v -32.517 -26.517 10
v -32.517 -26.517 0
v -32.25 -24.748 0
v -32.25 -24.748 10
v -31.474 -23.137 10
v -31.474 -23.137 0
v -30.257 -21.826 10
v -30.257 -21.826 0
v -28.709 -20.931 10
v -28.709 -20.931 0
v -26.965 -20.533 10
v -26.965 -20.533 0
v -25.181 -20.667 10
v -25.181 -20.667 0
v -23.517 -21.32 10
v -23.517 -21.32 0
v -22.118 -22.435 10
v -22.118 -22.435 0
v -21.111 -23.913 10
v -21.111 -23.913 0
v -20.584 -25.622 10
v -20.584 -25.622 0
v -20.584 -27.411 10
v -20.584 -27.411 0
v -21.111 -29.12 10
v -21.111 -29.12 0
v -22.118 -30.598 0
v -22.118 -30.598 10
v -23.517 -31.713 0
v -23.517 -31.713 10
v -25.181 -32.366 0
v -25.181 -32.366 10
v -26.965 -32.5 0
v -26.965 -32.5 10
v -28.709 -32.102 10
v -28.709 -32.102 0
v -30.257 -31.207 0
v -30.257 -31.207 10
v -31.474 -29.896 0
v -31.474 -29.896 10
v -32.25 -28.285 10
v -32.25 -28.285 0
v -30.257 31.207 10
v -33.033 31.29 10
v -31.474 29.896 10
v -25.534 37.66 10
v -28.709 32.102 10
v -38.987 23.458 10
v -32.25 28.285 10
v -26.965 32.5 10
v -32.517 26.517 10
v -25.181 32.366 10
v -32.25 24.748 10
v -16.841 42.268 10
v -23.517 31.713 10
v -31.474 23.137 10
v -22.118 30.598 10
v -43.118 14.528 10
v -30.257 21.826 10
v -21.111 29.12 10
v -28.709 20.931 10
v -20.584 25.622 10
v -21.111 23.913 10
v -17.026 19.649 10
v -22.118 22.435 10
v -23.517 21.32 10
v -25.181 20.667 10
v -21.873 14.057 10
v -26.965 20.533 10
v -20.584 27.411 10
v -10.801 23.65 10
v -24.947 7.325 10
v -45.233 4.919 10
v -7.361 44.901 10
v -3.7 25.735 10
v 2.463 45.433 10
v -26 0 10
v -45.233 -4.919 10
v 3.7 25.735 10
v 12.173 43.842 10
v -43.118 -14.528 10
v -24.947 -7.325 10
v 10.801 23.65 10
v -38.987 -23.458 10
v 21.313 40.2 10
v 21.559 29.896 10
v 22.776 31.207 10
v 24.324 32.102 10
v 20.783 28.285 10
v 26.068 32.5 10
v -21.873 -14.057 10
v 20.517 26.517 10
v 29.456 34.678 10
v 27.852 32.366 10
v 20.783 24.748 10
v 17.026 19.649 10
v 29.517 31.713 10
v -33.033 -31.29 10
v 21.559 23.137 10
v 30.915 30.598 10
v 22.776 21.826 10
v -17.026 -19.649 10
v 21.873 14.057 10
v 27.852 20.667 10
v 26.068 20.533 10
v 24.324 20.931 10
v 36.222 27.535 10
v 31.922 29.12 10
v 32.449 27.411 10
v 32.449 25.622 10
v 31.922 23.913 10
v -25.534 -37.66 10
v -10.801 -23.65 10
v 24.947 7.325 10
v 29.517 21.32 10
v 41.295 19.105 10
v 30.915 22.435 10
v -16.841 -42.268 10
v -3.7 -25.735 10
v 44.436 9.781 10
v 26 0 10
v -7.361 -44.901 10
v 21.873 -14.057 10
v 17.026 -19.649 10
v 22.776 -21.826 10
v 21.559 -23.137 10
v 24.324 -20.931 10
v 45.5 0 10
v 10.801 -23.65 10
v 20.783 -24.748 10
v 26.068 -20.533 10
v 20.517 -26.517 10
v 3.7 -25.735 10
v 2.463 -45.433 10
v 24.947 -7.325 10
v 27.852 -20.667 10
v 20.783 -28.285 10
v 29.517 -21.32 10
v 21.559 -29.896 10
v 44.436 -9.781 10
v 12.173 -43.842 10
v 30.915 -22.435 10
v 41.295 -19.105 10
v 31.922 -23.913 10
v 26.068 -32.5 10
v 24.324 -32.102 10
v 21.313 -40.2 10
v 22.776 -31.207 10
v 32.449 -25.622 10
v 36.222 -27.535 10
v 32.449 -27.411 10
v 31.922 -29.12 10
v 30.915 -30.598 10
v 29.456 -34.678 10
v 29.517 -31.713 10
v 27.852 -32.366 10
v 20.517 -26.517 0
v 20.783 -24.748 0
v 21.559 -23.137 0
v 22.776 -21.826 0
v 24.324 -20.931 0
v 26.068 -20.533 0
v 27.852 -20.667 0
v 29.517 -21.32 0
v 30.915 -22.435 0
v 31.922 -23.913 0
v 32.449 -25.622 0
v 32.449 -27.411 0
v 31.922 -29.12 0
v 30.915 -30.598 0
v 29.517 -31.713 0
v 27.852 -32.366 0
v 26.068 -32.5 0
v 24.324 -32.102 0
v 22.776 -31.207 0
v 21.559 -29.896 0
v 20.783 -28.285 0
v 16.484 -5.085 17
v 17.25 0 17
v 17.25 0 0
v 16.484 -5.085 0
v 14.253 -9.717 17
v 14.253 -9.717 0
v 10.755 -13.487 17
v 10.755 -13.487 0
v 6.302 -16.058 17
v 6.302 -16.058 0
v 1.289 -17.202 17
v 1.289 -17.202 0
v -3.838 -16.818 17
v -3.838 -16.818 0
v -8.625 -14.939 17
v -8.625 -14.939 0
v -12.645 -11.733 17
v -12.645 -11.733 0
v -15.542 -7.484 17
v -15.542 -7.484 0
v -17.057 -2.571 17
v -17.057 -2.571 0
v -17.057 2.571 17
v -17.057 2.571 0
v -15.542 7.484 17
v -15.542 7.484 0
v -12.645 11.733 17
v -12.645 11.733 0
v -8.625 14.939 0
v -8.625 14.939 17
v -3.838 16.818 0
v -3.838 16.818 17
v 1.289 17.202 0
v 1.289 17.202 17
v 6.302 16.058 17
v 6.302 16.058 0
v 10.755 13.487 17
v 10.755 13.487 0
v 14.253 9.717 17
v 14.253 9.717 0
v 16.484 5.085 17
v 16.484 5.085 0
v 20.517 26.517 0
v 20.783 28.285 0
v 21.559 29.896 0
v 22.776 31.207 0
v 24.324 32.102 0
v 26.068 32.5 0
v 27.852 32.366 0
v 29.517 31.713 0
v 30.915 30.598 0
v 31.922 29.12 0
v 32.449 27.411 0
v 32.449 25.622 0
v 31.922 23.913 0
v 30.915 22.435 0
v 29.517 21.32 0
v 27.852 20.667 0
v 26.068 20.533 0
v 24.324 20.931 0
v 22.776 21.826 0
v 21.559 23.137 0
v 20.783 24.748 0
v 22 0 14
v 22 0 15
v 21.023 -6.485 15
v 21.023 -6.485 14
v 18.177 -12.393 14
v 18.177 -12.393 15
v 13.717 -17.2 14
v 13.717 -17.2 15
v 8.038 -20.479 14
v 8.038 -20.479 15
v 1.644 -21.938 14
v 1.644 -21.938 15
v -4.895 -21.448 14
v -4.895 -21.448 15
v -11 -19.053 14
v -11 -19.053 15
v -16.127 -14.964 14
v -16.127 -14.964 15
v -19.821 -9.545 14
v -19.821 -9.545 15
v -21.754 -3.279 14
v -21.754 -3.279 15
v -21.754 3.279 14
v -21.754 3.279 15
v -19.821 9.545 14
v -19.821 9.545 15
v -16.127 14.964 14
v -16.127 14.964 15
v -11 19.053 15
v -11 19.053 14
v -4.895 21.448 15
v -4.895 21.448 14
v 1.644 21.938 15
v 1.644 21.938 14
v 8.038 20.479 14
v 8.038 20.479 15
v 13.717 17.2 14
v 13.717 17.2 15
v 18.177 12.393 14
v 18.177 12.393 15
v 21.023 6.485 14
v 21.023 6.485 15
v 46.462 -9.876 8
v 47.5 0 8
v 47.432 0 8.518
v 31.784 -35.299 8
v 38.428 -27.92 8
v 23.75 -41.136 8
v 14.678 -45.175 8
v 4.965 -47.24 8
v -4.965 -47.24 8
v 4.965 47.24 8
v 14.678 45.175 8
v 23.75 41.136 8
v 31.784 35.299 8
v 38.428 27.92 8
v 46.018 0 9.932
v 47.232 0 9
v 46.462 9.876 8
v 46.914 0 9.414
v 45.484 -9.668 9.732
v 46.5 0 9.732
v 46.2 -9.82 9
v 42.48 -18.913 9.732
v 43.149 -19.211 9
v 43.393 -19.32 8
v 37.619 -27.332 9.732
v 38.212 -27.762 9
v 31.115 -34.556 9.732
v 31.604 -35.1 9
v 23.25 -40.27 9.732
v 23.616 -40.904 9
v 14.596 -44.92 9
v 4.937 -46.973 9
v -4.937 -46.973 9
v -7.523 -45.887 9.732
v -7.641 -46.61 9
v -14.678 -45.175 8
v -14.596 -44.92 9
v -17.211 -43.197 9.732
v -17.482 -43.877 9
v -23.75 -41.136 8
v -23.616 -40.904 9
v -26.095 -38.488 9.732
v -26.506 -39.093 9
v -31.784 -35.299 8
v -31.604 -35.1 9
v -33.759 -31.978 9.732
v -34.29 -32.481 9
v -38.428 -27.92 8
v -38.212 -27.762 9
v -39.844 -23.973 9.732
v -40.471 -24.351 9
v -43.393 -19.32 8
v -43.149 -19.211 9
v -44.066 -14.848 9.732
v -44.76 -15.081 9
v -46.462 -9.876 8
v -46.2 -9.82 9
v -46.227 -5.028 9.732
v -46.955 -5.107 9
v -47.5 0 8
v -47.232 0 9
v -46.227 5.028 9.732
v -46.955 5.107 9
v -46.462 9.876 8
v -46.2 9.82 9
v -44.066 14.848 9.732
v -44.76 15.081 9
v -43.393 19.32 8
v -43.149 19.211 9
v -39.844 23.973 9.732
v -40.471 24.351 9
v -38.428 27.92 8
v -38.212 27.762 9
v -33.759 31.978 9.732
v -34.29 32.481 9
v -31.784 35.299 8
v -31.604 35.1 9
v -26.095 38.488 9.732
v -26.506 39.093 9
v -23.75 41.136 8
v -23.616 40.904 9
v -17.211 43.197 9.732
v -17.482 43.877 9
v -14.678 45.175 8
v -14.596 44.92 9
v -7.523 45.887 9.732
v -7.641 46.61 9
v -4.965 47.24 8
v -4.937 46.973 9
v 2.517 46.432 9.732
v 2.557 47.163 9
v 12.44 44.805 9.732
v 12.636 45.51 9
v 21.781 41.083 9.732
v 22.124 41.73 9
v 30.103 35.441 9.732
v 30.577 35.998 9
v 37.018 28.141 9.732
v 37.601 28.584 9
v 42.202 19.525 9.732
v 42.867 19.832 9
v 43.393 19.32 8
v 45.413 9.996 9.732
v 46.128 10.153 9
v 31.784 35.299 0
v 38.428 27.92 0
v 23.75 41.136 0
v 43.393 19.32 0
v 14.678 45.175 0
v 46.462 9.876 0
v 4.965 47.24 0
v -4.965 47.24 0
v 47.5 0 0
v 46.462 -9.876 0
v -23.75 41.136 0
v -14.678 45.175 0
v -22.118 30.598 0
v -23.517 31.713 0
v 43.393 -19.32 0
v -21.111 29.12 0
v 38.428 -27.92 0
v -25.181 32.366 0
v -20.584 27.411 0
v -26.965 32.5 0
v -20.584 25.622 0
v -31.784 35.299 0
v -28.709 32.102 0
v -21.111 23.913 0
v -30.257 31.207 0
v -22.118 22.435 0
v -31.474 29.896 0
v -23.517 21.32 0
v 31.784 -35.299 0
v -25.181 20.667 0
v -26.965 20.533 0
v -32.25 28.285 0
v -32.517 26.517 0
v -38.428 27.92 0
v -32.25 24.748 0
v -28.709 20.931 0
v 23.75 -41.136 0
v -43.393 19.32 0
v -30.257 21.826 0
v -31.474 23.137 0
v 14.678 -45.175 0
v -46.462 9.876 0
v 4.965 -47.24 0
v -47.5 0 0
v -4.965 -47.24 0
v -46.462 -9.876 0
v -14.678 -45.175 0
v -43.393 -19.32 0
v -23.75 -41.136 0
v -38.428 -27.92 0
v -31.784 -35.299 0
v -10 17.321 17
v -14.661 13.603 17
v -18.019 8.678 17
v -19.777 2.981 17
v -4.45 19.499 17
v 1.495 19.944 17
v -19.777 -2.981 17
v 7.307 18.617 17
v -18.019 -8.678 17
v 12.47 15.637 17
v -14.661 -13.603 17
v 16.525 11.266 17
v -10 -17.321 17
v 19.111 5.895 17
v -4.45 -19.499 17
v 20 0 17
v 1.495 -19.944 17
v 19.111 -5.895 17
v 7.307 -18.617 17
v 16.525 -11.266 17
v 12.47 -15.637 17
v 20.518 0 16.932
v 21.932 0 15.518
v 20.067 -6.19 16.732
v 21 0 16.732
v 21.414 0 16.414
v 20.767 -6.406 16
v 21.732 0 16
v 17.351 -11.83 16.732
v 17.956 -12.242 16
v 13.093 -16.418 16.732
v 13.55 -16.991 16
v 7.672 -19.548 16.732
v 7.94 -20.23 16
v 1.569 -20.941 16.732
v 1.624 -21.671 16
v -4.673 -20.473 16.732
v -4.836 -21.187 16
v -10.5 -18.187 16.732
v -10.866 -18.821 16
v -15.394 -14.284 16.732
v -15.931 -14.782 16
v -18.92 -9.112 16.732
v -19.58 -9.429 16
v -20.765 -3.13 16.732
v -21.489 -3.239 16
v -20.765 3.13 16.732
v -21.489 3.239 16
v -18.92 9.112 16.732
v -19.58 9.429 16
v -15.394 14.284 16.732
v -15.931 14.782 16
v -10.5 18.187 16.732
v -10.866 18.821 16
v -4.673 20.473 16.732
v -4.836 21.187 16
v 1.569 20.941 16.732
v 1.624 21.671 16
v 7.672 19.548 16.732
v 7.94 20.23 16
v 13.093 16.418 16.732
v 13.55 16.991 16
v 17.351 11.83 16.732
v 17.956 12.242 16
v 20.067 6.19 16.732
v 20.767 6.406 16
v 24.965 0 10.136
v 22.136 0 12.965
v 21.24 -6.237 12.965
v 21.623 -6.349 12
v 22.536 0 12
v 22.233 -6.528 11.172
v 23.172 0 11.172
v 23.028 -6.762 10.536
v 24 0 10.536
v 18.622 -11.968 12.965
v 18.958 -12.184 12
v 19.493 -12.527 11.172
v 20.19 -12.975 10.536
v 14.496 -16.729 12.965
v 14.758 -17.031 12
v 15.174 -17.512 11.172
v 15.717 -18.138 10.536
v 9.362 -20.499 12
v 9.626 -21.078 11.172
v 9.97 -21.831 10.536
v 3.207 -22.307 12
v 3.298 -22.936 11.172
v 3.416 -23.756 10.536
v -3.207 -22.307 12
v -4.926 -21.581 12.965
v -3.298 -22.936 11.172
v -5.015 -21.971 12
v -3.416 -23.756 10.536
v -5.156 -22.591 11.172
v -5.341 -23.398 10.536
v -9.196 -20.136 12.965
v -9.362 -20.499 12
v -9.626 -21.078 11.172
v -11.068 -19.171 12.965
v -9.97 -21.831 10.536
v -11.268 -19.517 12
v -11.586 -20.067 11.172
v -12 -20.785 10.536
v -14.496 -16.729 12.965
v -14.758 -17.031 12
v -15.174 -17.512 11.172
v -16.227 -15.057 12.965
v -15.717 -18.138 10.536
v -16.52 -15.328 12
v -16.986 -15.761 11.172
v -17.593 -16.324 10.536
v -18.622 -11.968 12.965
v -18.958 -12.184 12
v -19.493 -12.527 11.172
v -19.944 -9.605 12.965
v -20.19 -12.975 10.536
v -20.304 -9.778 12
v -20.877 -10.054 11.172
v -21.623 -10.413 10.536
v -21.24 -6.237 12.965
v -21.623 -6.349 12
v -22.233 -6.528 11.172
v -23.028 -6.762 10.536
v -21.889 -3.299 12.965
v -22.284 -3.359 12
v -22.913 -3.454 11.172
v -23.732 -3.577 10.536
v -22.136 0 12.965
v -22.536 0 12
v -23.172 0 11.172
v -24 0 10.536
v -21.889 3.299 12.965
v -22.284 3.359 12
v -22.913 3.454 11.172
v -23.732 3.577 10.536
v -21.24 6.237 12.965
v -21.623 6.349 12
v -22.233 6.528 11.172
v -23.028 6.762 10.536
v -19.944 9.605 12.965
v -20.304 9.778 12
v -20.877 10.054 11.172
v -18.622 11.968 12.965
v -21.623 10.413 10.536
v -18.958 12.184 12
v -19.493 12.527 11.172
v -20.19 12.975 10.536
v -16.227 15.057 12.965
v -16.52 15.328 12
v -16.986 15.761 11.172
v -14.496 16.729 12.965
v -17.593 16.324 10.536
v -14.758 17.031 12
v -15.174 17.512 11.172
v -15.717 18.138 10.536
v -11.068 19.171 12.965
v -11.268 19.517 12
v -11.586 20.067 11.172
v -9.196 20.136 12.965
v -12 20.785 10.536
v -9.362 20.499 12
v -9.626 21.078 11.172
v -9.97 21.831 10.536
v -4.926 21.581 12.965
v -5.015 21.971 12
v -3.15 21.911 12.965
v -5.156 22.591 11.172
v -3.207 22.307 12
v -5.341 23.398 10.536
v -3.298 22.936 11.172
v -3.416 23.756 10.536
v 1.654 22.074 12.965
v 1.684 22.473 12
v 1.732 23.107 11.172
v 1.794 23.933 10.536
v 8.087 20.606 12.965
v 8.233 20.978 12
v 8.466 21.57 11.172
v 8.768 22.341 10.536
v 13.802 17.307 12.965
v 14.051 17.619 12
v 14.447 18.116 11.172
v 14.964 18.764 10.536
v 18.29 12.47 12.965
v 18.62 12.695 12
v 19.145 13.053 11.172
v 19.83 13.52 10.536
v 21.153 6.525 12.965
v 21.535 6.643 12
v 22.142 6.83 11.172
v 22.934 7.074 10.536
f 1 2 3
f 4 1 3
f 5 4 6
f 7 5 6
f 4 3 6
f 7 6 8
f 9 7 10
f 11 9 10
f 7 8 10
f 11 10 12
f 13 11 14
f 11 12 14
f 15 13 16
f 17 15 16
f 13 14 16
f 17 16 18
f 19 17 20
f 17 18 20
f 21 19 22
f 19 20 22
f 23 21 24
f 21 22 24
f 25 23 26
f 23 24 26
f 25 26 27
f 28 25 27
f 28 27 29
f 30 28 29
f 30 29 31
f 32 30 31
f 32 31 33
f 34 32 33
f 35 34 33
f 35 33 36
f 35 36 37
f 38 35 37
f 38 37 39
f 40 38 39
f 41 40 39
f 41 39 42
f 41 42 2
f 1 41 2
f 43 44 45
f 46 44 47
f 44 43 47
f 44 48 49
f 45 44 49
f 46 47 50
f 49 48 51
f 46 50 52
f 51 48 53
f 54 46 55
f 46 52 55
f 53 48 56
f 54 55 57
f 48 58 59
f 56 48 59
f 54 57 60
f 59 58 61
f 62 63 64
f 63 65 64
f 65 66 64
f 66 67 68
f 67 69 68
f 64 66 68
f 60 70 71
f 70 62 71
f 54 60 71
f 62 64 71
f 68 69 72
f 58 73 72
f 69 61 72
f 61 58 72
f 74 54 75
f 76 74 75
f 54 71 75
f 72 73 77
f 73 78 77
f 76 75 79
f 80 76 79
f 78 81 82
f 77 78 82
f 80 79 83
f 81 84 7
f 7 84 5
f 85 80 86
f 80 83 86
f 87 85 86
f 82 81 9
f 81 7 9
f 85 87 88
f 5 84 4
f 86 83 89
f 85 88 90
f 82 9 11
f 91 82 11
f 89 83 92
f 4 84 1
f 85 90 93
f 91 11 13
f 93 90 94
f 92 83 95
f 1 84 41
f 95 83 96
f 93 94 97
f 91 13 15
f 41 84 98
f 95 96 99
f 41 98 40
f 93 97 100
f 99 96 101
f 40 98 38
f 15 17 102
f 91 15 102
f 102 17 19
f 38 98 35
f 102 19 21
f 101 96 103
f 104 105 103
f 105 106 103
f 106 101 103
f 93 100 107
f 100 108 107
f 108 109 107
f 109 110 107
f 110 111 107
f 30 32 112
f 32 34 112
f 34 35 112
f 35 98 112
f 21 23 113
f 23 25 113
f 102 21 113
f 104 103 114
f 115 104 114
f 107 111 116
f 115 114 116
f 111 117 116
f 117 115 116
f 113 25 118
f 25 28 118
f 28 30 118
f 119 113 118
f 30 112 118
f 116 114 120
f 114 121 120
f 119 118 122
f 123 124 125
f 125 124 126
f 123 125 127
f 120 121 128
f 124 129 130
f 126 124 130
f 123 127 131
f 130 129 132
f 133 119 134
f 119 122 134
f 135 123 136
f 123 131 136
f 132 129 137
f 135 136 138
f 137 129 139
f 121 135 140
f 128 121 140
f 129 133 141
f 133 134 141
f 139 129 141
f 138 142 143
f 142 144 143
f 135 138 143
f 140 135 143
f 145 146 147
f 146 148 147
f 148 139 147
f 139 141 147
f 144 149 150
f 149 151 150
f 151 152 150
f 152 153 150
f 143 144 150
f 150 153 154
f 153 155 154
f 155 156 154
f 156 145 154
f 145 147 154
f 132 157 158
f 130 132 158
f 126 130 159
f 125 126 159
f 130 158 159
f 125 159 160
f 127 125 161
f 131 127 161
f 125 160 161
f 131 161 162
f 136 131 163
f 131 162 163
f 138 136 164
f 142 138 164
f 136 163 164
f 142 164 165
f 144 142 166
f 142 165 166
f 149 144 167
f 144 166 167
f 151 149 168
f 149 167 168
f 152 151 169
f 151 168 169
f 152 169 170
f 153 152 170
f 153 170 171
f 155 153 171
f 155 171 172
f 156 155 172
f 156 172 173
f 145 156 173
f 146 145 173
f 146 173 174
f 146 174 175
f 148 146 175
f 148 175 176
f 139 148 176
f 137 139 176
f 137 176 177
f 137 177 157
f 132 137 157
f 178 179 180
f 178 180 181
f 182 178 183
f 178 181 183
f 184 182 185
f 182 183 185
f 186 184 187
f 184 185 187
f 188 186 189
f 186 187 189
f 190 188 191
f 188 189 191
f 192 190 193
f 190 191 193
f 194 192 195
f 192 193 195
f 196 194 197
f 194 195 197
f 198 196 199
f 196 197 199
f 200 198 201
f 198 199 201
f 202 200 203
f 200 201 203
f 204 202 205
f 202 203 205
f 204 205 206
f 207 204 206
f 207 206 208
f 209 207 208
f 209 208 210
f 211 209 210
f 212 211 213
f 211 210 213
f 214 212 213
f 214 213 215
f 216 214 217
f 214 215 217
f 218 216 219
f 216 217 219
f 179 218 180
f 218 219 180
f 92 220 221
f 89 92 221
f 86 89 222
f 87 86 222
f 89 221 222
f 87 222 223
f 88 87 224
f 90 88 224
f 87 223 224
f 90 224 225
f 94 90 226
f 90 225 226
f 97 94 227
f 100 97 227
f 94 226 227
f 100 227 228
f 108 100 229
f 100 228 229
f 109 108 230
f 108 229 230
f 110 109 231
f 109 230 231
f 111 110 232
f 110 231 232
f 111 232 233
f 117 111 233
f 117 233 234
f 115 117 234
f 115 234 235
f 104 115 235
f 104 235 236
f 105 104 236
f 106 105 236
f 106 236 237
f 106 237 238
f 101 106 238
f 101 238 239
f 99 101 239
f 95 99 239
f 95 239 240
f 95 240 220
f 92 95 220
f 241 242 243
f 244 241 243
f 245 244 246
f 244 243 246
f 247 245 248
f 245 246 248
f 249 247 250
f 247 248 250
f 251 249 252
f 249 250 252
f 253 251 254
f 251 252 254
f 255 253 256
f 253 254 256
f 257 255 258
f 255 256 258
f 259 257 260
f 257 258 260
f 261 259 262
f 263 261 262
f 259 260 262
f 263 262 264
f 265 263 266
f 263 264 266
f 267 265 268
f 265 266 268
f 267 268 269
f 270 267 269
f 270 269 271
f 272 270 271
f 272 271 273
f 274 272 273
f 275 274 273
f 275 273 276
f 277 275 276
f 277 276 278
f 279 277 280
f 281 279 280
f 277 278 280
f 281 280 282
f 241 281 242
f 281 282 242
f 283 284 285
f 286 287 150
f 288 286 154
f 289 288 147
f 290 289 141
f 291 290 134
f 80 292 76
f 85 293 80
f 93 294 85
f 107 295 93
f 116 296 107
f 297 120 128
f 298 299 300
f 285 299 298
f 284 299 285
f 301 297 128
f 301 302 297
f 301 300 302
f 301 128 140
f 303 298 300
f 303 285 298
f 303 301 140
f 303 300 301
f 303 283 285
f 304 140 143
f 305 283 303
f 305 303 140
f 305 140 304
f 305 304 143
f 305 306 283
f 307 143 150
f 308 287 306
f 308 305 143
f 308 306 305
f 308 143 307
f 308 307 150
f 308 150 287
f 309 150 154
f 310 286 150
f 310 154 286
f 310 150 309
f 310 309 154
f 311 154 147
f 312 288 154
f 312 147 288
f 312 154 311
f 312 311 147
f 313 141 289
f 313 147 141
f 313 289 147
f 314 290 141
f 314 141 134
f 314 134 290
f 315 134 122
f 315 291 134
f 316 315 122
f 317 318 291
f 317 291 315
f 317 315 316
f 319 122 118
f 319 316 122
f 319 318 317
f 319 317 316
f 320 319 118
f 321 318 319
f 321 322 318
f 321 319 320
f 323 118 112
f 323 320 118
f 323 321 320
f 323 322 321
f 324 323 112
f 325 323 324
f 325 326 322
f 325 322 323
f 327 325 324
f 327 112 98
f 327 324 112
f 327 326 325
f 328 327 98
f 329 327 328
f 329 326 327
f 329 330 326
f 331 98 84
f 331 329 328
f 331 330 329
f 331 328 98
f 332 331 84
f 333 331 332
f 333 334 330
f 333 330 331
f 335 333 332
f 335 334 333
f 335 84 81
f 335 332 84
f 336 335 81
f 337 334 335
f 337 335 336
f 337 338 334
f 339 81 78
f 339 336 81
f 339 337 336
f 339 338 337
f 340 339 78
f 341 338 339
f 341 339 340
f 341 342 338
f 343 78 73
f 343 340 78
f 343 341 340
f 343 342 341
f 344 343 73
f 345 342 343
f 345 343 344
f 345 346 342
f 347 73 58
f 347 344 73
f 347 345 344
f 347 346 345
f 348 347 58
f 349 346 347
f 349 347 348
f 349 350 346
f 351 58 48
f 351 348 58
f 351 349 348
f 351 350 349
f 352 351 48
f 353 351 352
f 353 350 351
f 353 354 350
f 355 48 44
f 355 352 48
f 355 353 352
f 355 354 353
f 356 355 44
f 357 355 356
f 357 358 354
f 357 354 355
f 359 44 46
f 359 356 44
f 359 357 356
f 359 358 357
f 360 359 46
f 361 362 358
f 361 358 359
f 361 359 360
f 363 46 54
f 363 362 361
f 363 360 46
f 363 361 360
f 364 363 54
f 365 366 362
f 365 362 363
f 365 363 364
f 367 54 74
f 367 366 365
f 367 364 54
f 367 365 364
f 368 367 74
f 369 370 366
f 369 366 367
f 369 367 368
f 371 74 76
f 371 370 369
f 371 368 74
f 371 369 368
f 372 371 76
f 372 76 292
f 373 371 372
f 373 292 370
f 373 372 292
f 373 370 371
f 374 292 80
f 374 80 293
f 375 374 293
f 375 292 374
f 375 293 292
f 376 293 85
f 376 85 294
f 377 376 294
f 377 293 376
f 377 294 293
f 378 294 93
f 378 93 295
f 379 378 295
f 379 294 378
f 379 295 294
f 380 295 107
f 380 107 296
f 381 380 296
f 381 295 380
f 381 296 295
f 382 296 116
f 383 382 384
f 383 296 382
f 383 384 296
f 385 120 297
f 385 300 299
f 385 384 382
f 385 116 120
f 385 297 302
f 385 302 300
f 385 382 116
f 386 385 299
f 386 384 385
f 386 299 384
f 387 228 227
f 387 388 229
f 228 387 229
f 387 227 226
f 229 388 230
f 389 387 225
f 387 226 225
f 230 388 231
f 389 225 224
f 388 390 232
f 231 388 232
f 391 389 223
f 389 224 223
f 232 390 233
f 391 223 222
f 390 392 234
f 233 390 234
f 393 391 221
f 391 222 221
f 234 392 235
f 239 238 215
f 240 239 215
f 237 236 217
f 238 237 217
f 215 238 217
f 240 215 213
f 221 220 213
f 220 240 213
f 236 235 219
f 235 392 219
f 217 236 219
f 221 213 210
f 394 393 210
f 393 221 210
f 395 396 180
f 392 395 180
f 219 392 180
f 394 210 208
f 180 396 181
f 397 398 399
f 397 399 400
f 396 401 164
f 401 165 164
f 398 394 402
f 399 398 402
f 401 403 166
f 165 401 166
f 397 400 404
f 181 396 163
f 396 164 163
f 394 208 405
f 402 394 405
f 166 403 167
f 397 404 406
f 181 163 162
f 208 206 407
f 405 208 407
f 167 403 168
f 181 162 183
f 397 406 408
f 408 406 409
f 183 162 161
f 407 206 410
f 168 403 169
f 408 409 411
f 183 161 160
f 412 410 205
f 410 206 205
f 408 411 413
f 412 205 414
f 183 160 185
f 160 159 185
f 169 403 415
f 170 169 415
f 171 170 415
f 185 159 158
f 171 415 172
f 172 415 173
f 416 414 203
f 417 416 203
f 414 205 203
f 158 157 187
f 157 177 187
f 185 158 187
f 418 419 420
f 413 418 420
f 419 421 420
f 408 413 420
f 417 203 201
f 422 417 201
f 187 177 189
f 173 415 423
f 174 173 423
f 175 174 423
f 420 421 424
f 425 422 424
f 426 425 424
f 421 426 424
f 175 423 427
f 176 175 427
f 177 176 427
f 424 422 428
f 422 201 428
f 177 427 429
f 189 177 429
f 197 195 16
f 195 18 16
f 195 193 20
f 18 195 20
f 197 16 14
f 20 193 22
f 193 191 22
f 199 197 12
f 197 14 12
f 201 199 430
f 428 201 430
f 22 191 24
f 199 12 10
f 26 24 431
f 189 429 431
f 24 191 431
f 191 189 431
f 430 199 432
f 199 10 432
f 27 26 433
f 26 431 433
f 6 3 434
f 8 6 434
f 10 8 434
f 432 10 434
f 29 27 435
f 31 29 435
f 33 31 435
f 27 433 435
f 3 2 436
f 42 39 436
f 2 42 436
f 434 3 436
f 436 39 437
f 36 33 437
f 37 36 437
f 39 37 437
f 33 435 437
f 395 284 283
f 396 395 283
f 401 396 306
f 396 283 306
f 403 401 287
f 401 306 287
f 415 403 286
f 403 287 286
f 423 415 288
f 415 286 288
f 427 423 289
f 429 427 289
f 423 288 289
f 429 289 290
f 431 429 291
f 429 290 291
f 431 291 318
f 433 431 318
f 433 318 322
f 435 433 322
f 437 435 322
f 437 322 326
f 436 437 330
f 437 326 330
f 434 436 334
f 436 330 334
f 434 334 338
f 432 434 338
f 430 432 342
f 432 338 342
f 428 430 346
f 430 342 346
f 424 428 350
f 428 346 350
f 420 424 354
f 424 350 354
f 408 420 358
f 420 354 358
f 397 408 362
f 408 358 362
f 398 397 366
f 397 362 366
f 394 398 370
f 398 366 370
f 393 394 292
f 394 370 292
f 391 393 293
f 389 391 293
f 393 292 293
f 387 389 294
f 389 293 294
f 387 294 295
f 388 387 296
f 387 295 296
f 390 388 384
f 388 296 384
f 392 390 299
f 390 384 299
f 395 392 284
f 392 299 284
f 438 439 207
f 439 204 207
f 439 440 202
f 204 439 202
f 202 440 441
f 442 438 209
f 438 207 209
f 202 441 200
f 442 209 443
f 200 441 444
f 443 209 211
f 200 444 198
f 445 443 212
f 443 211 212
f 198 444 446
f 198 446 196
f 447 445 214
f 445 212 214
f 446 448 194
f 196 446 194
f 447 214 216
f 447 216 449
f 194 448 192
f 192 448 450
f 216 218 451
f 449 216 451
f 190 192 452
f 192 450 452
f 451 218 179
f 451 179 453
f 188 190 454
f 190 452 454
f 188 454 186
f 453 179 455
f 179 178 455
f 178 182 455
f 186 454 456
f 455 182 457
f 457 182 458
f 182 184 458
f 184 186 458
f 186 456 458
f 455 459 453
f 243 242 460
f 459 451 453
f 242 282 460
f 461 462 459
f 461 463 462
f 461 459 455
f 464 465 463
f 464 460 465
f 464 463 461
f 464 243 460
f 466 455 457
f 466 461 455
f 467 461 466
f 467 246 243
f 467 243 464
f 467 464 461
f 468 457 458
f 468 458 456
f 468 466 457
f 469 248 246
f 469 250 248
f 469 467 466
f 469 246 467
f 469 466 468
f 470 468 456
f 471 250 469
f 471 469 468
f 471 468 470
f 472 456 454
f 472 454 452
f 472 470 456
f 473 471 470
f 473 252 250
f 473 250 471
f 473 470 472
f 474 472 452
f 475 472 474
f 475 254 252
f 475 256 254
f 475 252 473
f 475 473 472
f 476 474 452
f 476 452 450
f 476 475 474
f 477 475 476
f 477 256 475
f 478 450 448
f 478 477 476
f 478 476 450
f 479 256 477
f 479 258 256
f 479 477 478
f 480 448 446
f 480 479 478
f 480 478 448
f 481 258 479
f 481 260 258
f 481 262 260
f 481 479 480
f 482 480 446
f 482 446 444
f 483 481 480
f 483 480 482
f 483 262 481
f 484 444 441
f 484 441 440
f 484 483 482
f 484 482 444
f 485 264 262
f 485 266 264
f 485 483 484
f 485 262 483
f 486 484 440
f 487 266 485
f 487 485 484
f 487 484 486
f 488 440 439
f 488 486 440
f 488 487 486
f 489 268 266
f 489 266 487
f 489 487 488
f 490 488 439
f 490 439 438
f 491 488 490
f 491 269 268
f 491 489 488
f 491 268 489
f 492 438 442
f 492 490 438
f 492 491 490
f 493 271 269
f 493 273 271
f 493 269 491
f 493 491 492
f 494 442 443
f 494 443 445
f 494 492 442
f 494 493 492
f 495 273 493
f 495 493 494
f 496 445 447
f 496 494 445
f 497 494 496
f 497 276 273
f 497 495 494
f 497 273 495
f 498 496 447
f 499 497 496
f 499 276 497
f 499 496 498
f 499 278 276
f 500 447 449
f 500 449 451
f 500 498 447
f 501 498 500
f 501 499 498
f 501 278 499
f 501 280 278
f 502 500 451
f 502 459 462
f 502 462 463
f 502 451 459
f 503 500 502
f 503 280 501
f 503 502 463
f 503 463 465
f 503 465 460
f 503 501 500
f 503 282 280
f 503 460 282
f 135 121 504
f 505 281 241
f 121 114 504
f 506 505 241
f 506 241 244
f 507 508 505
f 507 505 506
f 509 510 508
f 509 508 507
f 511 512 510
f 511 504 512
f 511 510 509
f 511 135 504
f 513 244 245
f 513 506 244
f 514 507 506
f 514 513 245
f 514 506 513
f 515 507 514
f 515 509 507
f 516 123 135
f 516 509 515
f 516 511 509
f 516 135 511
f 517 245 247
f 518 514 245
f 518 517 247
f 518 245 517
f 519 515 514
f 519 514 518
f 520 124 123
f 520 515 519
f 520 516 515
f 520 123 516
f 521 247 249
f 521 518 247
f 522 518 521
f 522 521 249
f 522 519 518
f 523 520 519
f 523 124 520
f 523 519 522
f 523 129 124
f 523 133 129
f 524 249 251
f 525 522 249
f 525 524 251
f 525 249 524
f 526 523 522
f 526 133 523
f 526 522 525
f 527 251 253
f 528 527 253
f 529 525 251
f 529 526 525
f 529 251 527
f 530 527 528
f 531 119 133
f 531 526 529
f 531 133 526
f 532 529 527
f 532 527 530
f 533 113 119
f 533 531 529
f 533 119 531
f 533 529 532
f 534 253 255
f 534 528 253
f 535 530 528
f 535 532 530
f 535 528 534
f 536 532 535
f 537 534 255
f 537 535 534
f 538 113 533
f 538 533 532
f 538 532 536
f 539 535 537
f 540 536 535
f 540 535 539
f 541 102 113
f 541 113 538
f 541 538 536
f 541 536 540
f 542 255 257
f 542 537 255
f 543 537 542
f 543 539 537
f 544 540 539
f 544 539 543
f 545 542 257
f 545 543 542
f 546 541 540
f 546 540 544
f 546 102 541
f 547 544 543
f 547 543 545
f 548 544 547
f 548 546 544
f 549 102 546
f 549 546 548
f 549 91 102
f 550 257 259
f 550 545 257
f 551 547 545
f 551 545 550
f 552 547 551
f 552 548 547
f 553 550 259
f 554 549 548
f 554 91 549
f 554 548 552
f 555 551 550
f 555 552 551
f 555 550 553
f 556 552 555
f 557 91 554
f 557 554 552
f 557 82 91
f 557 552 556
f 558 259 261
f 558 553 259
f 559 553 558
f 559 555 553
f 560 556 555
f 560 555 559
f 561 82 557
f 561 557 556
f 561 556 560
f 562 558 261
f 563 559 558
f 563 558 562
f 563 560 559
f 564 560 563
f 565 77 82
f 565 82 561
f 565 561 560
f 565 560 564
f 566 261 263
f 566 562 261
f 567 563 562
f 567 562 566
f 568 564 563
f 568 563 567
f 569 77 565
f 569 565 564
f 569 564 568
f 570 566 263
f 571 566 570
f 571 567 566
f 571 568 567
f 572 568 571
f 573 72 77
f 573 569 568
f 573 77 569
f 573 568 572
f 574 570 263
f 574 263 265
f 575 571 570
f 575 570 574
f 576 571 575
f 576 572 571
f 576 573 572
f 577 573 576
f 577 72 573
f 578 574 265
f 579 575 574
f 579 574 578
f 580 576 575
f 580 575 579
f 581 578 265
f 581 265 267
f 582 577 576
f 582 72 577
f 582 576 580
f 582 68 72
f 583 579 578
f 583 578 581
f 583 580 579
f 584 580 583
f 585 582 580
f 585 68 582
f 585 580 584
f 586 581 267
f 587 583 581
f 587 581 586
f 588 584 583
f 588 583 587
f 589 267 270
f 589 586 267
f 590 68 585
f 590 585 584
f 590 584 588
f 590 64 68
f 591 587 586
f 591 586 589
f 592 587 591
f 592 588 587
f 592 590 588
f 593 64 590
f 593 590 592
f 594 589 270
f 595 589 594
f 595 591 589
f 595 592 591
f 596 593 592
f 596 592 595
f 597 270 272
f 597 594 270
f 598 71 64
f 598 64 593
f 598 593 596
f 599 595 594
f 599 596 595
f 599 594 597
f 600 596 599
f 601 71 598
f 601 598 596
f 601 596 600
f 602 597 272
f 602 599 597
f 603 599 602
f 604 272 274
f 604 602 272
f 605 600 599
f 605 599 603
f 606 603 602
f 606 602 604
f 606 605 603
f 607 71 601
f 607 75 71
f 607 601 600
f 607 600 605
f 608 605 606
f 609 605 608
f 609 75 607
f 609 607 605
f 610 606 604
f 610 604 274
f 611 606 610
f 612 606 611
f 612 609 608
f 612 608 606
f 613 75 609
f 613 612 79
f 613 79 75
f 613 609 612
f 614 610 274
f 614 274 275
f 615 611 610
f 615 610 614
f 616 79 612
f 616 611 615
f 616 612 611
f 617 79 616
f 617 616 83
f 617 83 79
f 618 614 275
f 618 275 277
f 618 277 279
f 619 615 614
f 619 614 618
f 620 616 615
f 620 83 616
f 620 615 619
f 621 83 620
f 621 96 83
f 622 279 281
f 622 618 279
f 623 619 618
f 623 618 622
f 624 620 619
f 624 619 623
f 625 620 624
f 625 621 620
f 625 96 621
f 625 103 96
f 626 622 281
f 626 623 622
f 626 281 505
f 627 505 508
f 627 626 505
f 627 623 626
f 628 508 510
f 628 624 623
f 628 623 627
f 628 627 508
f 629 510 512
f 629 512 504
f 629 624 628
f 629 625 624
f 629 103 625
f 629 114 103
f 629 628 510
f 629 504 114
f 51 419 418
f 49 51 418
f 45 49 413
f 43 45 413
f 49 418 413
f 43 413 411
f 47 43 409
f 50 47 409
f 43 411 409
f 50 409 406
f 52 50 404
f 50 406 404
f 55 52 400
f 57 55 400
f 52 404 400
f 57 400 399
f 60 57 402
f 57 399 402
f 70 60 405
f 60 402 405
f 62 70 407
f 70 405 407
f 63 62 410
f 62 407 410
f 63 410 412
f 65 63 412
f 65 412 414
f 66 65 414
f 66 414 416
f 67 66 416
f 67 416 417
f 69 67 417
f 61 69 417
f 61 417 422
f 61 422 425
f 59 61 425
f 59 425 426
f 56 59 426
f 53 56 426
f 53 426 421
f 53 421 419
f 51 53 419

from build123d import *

# Parameters (mm, degrees)
F3_D = 12
F4_R = 2
F5_R = 4


with BuildPart() as f1:
    # F0 (on Front) → F1 (revolve)
    with BuildSketch(Plane.XZ):
        Polygon((22, 17), (17.25, 17), (17.25, 0), (47.5, 0), (47.5, 10), (22, 10), align=None)
    revolve(axis=Axis((0, 0, 4.398516), (0, 0, -1)))

    # F3 (through all)
    with Locations(Plane.XY.offset(10)):
        with Locations((-26.516504, 26.516504), (-26.516504, -26.516504), (26.516504, -26.516504), (26.516504, 26.516504)):
            Hole(F3_D / 2)

    # F4
    f4_edges = [f1.edges().sort_by_distance(p)[0] for p in [
        (-22, 0, 17),
        (-47.5, 0, 10),
    ]]
    fillet(f4_edges, radius=F4_R)

    # F5
    f5_edges = [f1.edges().sort_by_distance(p)[0] for p in [
        (-22, 0, 10),
    ]]
    fillet(f5_edges, radius=F5_R)


solid = f1.part
